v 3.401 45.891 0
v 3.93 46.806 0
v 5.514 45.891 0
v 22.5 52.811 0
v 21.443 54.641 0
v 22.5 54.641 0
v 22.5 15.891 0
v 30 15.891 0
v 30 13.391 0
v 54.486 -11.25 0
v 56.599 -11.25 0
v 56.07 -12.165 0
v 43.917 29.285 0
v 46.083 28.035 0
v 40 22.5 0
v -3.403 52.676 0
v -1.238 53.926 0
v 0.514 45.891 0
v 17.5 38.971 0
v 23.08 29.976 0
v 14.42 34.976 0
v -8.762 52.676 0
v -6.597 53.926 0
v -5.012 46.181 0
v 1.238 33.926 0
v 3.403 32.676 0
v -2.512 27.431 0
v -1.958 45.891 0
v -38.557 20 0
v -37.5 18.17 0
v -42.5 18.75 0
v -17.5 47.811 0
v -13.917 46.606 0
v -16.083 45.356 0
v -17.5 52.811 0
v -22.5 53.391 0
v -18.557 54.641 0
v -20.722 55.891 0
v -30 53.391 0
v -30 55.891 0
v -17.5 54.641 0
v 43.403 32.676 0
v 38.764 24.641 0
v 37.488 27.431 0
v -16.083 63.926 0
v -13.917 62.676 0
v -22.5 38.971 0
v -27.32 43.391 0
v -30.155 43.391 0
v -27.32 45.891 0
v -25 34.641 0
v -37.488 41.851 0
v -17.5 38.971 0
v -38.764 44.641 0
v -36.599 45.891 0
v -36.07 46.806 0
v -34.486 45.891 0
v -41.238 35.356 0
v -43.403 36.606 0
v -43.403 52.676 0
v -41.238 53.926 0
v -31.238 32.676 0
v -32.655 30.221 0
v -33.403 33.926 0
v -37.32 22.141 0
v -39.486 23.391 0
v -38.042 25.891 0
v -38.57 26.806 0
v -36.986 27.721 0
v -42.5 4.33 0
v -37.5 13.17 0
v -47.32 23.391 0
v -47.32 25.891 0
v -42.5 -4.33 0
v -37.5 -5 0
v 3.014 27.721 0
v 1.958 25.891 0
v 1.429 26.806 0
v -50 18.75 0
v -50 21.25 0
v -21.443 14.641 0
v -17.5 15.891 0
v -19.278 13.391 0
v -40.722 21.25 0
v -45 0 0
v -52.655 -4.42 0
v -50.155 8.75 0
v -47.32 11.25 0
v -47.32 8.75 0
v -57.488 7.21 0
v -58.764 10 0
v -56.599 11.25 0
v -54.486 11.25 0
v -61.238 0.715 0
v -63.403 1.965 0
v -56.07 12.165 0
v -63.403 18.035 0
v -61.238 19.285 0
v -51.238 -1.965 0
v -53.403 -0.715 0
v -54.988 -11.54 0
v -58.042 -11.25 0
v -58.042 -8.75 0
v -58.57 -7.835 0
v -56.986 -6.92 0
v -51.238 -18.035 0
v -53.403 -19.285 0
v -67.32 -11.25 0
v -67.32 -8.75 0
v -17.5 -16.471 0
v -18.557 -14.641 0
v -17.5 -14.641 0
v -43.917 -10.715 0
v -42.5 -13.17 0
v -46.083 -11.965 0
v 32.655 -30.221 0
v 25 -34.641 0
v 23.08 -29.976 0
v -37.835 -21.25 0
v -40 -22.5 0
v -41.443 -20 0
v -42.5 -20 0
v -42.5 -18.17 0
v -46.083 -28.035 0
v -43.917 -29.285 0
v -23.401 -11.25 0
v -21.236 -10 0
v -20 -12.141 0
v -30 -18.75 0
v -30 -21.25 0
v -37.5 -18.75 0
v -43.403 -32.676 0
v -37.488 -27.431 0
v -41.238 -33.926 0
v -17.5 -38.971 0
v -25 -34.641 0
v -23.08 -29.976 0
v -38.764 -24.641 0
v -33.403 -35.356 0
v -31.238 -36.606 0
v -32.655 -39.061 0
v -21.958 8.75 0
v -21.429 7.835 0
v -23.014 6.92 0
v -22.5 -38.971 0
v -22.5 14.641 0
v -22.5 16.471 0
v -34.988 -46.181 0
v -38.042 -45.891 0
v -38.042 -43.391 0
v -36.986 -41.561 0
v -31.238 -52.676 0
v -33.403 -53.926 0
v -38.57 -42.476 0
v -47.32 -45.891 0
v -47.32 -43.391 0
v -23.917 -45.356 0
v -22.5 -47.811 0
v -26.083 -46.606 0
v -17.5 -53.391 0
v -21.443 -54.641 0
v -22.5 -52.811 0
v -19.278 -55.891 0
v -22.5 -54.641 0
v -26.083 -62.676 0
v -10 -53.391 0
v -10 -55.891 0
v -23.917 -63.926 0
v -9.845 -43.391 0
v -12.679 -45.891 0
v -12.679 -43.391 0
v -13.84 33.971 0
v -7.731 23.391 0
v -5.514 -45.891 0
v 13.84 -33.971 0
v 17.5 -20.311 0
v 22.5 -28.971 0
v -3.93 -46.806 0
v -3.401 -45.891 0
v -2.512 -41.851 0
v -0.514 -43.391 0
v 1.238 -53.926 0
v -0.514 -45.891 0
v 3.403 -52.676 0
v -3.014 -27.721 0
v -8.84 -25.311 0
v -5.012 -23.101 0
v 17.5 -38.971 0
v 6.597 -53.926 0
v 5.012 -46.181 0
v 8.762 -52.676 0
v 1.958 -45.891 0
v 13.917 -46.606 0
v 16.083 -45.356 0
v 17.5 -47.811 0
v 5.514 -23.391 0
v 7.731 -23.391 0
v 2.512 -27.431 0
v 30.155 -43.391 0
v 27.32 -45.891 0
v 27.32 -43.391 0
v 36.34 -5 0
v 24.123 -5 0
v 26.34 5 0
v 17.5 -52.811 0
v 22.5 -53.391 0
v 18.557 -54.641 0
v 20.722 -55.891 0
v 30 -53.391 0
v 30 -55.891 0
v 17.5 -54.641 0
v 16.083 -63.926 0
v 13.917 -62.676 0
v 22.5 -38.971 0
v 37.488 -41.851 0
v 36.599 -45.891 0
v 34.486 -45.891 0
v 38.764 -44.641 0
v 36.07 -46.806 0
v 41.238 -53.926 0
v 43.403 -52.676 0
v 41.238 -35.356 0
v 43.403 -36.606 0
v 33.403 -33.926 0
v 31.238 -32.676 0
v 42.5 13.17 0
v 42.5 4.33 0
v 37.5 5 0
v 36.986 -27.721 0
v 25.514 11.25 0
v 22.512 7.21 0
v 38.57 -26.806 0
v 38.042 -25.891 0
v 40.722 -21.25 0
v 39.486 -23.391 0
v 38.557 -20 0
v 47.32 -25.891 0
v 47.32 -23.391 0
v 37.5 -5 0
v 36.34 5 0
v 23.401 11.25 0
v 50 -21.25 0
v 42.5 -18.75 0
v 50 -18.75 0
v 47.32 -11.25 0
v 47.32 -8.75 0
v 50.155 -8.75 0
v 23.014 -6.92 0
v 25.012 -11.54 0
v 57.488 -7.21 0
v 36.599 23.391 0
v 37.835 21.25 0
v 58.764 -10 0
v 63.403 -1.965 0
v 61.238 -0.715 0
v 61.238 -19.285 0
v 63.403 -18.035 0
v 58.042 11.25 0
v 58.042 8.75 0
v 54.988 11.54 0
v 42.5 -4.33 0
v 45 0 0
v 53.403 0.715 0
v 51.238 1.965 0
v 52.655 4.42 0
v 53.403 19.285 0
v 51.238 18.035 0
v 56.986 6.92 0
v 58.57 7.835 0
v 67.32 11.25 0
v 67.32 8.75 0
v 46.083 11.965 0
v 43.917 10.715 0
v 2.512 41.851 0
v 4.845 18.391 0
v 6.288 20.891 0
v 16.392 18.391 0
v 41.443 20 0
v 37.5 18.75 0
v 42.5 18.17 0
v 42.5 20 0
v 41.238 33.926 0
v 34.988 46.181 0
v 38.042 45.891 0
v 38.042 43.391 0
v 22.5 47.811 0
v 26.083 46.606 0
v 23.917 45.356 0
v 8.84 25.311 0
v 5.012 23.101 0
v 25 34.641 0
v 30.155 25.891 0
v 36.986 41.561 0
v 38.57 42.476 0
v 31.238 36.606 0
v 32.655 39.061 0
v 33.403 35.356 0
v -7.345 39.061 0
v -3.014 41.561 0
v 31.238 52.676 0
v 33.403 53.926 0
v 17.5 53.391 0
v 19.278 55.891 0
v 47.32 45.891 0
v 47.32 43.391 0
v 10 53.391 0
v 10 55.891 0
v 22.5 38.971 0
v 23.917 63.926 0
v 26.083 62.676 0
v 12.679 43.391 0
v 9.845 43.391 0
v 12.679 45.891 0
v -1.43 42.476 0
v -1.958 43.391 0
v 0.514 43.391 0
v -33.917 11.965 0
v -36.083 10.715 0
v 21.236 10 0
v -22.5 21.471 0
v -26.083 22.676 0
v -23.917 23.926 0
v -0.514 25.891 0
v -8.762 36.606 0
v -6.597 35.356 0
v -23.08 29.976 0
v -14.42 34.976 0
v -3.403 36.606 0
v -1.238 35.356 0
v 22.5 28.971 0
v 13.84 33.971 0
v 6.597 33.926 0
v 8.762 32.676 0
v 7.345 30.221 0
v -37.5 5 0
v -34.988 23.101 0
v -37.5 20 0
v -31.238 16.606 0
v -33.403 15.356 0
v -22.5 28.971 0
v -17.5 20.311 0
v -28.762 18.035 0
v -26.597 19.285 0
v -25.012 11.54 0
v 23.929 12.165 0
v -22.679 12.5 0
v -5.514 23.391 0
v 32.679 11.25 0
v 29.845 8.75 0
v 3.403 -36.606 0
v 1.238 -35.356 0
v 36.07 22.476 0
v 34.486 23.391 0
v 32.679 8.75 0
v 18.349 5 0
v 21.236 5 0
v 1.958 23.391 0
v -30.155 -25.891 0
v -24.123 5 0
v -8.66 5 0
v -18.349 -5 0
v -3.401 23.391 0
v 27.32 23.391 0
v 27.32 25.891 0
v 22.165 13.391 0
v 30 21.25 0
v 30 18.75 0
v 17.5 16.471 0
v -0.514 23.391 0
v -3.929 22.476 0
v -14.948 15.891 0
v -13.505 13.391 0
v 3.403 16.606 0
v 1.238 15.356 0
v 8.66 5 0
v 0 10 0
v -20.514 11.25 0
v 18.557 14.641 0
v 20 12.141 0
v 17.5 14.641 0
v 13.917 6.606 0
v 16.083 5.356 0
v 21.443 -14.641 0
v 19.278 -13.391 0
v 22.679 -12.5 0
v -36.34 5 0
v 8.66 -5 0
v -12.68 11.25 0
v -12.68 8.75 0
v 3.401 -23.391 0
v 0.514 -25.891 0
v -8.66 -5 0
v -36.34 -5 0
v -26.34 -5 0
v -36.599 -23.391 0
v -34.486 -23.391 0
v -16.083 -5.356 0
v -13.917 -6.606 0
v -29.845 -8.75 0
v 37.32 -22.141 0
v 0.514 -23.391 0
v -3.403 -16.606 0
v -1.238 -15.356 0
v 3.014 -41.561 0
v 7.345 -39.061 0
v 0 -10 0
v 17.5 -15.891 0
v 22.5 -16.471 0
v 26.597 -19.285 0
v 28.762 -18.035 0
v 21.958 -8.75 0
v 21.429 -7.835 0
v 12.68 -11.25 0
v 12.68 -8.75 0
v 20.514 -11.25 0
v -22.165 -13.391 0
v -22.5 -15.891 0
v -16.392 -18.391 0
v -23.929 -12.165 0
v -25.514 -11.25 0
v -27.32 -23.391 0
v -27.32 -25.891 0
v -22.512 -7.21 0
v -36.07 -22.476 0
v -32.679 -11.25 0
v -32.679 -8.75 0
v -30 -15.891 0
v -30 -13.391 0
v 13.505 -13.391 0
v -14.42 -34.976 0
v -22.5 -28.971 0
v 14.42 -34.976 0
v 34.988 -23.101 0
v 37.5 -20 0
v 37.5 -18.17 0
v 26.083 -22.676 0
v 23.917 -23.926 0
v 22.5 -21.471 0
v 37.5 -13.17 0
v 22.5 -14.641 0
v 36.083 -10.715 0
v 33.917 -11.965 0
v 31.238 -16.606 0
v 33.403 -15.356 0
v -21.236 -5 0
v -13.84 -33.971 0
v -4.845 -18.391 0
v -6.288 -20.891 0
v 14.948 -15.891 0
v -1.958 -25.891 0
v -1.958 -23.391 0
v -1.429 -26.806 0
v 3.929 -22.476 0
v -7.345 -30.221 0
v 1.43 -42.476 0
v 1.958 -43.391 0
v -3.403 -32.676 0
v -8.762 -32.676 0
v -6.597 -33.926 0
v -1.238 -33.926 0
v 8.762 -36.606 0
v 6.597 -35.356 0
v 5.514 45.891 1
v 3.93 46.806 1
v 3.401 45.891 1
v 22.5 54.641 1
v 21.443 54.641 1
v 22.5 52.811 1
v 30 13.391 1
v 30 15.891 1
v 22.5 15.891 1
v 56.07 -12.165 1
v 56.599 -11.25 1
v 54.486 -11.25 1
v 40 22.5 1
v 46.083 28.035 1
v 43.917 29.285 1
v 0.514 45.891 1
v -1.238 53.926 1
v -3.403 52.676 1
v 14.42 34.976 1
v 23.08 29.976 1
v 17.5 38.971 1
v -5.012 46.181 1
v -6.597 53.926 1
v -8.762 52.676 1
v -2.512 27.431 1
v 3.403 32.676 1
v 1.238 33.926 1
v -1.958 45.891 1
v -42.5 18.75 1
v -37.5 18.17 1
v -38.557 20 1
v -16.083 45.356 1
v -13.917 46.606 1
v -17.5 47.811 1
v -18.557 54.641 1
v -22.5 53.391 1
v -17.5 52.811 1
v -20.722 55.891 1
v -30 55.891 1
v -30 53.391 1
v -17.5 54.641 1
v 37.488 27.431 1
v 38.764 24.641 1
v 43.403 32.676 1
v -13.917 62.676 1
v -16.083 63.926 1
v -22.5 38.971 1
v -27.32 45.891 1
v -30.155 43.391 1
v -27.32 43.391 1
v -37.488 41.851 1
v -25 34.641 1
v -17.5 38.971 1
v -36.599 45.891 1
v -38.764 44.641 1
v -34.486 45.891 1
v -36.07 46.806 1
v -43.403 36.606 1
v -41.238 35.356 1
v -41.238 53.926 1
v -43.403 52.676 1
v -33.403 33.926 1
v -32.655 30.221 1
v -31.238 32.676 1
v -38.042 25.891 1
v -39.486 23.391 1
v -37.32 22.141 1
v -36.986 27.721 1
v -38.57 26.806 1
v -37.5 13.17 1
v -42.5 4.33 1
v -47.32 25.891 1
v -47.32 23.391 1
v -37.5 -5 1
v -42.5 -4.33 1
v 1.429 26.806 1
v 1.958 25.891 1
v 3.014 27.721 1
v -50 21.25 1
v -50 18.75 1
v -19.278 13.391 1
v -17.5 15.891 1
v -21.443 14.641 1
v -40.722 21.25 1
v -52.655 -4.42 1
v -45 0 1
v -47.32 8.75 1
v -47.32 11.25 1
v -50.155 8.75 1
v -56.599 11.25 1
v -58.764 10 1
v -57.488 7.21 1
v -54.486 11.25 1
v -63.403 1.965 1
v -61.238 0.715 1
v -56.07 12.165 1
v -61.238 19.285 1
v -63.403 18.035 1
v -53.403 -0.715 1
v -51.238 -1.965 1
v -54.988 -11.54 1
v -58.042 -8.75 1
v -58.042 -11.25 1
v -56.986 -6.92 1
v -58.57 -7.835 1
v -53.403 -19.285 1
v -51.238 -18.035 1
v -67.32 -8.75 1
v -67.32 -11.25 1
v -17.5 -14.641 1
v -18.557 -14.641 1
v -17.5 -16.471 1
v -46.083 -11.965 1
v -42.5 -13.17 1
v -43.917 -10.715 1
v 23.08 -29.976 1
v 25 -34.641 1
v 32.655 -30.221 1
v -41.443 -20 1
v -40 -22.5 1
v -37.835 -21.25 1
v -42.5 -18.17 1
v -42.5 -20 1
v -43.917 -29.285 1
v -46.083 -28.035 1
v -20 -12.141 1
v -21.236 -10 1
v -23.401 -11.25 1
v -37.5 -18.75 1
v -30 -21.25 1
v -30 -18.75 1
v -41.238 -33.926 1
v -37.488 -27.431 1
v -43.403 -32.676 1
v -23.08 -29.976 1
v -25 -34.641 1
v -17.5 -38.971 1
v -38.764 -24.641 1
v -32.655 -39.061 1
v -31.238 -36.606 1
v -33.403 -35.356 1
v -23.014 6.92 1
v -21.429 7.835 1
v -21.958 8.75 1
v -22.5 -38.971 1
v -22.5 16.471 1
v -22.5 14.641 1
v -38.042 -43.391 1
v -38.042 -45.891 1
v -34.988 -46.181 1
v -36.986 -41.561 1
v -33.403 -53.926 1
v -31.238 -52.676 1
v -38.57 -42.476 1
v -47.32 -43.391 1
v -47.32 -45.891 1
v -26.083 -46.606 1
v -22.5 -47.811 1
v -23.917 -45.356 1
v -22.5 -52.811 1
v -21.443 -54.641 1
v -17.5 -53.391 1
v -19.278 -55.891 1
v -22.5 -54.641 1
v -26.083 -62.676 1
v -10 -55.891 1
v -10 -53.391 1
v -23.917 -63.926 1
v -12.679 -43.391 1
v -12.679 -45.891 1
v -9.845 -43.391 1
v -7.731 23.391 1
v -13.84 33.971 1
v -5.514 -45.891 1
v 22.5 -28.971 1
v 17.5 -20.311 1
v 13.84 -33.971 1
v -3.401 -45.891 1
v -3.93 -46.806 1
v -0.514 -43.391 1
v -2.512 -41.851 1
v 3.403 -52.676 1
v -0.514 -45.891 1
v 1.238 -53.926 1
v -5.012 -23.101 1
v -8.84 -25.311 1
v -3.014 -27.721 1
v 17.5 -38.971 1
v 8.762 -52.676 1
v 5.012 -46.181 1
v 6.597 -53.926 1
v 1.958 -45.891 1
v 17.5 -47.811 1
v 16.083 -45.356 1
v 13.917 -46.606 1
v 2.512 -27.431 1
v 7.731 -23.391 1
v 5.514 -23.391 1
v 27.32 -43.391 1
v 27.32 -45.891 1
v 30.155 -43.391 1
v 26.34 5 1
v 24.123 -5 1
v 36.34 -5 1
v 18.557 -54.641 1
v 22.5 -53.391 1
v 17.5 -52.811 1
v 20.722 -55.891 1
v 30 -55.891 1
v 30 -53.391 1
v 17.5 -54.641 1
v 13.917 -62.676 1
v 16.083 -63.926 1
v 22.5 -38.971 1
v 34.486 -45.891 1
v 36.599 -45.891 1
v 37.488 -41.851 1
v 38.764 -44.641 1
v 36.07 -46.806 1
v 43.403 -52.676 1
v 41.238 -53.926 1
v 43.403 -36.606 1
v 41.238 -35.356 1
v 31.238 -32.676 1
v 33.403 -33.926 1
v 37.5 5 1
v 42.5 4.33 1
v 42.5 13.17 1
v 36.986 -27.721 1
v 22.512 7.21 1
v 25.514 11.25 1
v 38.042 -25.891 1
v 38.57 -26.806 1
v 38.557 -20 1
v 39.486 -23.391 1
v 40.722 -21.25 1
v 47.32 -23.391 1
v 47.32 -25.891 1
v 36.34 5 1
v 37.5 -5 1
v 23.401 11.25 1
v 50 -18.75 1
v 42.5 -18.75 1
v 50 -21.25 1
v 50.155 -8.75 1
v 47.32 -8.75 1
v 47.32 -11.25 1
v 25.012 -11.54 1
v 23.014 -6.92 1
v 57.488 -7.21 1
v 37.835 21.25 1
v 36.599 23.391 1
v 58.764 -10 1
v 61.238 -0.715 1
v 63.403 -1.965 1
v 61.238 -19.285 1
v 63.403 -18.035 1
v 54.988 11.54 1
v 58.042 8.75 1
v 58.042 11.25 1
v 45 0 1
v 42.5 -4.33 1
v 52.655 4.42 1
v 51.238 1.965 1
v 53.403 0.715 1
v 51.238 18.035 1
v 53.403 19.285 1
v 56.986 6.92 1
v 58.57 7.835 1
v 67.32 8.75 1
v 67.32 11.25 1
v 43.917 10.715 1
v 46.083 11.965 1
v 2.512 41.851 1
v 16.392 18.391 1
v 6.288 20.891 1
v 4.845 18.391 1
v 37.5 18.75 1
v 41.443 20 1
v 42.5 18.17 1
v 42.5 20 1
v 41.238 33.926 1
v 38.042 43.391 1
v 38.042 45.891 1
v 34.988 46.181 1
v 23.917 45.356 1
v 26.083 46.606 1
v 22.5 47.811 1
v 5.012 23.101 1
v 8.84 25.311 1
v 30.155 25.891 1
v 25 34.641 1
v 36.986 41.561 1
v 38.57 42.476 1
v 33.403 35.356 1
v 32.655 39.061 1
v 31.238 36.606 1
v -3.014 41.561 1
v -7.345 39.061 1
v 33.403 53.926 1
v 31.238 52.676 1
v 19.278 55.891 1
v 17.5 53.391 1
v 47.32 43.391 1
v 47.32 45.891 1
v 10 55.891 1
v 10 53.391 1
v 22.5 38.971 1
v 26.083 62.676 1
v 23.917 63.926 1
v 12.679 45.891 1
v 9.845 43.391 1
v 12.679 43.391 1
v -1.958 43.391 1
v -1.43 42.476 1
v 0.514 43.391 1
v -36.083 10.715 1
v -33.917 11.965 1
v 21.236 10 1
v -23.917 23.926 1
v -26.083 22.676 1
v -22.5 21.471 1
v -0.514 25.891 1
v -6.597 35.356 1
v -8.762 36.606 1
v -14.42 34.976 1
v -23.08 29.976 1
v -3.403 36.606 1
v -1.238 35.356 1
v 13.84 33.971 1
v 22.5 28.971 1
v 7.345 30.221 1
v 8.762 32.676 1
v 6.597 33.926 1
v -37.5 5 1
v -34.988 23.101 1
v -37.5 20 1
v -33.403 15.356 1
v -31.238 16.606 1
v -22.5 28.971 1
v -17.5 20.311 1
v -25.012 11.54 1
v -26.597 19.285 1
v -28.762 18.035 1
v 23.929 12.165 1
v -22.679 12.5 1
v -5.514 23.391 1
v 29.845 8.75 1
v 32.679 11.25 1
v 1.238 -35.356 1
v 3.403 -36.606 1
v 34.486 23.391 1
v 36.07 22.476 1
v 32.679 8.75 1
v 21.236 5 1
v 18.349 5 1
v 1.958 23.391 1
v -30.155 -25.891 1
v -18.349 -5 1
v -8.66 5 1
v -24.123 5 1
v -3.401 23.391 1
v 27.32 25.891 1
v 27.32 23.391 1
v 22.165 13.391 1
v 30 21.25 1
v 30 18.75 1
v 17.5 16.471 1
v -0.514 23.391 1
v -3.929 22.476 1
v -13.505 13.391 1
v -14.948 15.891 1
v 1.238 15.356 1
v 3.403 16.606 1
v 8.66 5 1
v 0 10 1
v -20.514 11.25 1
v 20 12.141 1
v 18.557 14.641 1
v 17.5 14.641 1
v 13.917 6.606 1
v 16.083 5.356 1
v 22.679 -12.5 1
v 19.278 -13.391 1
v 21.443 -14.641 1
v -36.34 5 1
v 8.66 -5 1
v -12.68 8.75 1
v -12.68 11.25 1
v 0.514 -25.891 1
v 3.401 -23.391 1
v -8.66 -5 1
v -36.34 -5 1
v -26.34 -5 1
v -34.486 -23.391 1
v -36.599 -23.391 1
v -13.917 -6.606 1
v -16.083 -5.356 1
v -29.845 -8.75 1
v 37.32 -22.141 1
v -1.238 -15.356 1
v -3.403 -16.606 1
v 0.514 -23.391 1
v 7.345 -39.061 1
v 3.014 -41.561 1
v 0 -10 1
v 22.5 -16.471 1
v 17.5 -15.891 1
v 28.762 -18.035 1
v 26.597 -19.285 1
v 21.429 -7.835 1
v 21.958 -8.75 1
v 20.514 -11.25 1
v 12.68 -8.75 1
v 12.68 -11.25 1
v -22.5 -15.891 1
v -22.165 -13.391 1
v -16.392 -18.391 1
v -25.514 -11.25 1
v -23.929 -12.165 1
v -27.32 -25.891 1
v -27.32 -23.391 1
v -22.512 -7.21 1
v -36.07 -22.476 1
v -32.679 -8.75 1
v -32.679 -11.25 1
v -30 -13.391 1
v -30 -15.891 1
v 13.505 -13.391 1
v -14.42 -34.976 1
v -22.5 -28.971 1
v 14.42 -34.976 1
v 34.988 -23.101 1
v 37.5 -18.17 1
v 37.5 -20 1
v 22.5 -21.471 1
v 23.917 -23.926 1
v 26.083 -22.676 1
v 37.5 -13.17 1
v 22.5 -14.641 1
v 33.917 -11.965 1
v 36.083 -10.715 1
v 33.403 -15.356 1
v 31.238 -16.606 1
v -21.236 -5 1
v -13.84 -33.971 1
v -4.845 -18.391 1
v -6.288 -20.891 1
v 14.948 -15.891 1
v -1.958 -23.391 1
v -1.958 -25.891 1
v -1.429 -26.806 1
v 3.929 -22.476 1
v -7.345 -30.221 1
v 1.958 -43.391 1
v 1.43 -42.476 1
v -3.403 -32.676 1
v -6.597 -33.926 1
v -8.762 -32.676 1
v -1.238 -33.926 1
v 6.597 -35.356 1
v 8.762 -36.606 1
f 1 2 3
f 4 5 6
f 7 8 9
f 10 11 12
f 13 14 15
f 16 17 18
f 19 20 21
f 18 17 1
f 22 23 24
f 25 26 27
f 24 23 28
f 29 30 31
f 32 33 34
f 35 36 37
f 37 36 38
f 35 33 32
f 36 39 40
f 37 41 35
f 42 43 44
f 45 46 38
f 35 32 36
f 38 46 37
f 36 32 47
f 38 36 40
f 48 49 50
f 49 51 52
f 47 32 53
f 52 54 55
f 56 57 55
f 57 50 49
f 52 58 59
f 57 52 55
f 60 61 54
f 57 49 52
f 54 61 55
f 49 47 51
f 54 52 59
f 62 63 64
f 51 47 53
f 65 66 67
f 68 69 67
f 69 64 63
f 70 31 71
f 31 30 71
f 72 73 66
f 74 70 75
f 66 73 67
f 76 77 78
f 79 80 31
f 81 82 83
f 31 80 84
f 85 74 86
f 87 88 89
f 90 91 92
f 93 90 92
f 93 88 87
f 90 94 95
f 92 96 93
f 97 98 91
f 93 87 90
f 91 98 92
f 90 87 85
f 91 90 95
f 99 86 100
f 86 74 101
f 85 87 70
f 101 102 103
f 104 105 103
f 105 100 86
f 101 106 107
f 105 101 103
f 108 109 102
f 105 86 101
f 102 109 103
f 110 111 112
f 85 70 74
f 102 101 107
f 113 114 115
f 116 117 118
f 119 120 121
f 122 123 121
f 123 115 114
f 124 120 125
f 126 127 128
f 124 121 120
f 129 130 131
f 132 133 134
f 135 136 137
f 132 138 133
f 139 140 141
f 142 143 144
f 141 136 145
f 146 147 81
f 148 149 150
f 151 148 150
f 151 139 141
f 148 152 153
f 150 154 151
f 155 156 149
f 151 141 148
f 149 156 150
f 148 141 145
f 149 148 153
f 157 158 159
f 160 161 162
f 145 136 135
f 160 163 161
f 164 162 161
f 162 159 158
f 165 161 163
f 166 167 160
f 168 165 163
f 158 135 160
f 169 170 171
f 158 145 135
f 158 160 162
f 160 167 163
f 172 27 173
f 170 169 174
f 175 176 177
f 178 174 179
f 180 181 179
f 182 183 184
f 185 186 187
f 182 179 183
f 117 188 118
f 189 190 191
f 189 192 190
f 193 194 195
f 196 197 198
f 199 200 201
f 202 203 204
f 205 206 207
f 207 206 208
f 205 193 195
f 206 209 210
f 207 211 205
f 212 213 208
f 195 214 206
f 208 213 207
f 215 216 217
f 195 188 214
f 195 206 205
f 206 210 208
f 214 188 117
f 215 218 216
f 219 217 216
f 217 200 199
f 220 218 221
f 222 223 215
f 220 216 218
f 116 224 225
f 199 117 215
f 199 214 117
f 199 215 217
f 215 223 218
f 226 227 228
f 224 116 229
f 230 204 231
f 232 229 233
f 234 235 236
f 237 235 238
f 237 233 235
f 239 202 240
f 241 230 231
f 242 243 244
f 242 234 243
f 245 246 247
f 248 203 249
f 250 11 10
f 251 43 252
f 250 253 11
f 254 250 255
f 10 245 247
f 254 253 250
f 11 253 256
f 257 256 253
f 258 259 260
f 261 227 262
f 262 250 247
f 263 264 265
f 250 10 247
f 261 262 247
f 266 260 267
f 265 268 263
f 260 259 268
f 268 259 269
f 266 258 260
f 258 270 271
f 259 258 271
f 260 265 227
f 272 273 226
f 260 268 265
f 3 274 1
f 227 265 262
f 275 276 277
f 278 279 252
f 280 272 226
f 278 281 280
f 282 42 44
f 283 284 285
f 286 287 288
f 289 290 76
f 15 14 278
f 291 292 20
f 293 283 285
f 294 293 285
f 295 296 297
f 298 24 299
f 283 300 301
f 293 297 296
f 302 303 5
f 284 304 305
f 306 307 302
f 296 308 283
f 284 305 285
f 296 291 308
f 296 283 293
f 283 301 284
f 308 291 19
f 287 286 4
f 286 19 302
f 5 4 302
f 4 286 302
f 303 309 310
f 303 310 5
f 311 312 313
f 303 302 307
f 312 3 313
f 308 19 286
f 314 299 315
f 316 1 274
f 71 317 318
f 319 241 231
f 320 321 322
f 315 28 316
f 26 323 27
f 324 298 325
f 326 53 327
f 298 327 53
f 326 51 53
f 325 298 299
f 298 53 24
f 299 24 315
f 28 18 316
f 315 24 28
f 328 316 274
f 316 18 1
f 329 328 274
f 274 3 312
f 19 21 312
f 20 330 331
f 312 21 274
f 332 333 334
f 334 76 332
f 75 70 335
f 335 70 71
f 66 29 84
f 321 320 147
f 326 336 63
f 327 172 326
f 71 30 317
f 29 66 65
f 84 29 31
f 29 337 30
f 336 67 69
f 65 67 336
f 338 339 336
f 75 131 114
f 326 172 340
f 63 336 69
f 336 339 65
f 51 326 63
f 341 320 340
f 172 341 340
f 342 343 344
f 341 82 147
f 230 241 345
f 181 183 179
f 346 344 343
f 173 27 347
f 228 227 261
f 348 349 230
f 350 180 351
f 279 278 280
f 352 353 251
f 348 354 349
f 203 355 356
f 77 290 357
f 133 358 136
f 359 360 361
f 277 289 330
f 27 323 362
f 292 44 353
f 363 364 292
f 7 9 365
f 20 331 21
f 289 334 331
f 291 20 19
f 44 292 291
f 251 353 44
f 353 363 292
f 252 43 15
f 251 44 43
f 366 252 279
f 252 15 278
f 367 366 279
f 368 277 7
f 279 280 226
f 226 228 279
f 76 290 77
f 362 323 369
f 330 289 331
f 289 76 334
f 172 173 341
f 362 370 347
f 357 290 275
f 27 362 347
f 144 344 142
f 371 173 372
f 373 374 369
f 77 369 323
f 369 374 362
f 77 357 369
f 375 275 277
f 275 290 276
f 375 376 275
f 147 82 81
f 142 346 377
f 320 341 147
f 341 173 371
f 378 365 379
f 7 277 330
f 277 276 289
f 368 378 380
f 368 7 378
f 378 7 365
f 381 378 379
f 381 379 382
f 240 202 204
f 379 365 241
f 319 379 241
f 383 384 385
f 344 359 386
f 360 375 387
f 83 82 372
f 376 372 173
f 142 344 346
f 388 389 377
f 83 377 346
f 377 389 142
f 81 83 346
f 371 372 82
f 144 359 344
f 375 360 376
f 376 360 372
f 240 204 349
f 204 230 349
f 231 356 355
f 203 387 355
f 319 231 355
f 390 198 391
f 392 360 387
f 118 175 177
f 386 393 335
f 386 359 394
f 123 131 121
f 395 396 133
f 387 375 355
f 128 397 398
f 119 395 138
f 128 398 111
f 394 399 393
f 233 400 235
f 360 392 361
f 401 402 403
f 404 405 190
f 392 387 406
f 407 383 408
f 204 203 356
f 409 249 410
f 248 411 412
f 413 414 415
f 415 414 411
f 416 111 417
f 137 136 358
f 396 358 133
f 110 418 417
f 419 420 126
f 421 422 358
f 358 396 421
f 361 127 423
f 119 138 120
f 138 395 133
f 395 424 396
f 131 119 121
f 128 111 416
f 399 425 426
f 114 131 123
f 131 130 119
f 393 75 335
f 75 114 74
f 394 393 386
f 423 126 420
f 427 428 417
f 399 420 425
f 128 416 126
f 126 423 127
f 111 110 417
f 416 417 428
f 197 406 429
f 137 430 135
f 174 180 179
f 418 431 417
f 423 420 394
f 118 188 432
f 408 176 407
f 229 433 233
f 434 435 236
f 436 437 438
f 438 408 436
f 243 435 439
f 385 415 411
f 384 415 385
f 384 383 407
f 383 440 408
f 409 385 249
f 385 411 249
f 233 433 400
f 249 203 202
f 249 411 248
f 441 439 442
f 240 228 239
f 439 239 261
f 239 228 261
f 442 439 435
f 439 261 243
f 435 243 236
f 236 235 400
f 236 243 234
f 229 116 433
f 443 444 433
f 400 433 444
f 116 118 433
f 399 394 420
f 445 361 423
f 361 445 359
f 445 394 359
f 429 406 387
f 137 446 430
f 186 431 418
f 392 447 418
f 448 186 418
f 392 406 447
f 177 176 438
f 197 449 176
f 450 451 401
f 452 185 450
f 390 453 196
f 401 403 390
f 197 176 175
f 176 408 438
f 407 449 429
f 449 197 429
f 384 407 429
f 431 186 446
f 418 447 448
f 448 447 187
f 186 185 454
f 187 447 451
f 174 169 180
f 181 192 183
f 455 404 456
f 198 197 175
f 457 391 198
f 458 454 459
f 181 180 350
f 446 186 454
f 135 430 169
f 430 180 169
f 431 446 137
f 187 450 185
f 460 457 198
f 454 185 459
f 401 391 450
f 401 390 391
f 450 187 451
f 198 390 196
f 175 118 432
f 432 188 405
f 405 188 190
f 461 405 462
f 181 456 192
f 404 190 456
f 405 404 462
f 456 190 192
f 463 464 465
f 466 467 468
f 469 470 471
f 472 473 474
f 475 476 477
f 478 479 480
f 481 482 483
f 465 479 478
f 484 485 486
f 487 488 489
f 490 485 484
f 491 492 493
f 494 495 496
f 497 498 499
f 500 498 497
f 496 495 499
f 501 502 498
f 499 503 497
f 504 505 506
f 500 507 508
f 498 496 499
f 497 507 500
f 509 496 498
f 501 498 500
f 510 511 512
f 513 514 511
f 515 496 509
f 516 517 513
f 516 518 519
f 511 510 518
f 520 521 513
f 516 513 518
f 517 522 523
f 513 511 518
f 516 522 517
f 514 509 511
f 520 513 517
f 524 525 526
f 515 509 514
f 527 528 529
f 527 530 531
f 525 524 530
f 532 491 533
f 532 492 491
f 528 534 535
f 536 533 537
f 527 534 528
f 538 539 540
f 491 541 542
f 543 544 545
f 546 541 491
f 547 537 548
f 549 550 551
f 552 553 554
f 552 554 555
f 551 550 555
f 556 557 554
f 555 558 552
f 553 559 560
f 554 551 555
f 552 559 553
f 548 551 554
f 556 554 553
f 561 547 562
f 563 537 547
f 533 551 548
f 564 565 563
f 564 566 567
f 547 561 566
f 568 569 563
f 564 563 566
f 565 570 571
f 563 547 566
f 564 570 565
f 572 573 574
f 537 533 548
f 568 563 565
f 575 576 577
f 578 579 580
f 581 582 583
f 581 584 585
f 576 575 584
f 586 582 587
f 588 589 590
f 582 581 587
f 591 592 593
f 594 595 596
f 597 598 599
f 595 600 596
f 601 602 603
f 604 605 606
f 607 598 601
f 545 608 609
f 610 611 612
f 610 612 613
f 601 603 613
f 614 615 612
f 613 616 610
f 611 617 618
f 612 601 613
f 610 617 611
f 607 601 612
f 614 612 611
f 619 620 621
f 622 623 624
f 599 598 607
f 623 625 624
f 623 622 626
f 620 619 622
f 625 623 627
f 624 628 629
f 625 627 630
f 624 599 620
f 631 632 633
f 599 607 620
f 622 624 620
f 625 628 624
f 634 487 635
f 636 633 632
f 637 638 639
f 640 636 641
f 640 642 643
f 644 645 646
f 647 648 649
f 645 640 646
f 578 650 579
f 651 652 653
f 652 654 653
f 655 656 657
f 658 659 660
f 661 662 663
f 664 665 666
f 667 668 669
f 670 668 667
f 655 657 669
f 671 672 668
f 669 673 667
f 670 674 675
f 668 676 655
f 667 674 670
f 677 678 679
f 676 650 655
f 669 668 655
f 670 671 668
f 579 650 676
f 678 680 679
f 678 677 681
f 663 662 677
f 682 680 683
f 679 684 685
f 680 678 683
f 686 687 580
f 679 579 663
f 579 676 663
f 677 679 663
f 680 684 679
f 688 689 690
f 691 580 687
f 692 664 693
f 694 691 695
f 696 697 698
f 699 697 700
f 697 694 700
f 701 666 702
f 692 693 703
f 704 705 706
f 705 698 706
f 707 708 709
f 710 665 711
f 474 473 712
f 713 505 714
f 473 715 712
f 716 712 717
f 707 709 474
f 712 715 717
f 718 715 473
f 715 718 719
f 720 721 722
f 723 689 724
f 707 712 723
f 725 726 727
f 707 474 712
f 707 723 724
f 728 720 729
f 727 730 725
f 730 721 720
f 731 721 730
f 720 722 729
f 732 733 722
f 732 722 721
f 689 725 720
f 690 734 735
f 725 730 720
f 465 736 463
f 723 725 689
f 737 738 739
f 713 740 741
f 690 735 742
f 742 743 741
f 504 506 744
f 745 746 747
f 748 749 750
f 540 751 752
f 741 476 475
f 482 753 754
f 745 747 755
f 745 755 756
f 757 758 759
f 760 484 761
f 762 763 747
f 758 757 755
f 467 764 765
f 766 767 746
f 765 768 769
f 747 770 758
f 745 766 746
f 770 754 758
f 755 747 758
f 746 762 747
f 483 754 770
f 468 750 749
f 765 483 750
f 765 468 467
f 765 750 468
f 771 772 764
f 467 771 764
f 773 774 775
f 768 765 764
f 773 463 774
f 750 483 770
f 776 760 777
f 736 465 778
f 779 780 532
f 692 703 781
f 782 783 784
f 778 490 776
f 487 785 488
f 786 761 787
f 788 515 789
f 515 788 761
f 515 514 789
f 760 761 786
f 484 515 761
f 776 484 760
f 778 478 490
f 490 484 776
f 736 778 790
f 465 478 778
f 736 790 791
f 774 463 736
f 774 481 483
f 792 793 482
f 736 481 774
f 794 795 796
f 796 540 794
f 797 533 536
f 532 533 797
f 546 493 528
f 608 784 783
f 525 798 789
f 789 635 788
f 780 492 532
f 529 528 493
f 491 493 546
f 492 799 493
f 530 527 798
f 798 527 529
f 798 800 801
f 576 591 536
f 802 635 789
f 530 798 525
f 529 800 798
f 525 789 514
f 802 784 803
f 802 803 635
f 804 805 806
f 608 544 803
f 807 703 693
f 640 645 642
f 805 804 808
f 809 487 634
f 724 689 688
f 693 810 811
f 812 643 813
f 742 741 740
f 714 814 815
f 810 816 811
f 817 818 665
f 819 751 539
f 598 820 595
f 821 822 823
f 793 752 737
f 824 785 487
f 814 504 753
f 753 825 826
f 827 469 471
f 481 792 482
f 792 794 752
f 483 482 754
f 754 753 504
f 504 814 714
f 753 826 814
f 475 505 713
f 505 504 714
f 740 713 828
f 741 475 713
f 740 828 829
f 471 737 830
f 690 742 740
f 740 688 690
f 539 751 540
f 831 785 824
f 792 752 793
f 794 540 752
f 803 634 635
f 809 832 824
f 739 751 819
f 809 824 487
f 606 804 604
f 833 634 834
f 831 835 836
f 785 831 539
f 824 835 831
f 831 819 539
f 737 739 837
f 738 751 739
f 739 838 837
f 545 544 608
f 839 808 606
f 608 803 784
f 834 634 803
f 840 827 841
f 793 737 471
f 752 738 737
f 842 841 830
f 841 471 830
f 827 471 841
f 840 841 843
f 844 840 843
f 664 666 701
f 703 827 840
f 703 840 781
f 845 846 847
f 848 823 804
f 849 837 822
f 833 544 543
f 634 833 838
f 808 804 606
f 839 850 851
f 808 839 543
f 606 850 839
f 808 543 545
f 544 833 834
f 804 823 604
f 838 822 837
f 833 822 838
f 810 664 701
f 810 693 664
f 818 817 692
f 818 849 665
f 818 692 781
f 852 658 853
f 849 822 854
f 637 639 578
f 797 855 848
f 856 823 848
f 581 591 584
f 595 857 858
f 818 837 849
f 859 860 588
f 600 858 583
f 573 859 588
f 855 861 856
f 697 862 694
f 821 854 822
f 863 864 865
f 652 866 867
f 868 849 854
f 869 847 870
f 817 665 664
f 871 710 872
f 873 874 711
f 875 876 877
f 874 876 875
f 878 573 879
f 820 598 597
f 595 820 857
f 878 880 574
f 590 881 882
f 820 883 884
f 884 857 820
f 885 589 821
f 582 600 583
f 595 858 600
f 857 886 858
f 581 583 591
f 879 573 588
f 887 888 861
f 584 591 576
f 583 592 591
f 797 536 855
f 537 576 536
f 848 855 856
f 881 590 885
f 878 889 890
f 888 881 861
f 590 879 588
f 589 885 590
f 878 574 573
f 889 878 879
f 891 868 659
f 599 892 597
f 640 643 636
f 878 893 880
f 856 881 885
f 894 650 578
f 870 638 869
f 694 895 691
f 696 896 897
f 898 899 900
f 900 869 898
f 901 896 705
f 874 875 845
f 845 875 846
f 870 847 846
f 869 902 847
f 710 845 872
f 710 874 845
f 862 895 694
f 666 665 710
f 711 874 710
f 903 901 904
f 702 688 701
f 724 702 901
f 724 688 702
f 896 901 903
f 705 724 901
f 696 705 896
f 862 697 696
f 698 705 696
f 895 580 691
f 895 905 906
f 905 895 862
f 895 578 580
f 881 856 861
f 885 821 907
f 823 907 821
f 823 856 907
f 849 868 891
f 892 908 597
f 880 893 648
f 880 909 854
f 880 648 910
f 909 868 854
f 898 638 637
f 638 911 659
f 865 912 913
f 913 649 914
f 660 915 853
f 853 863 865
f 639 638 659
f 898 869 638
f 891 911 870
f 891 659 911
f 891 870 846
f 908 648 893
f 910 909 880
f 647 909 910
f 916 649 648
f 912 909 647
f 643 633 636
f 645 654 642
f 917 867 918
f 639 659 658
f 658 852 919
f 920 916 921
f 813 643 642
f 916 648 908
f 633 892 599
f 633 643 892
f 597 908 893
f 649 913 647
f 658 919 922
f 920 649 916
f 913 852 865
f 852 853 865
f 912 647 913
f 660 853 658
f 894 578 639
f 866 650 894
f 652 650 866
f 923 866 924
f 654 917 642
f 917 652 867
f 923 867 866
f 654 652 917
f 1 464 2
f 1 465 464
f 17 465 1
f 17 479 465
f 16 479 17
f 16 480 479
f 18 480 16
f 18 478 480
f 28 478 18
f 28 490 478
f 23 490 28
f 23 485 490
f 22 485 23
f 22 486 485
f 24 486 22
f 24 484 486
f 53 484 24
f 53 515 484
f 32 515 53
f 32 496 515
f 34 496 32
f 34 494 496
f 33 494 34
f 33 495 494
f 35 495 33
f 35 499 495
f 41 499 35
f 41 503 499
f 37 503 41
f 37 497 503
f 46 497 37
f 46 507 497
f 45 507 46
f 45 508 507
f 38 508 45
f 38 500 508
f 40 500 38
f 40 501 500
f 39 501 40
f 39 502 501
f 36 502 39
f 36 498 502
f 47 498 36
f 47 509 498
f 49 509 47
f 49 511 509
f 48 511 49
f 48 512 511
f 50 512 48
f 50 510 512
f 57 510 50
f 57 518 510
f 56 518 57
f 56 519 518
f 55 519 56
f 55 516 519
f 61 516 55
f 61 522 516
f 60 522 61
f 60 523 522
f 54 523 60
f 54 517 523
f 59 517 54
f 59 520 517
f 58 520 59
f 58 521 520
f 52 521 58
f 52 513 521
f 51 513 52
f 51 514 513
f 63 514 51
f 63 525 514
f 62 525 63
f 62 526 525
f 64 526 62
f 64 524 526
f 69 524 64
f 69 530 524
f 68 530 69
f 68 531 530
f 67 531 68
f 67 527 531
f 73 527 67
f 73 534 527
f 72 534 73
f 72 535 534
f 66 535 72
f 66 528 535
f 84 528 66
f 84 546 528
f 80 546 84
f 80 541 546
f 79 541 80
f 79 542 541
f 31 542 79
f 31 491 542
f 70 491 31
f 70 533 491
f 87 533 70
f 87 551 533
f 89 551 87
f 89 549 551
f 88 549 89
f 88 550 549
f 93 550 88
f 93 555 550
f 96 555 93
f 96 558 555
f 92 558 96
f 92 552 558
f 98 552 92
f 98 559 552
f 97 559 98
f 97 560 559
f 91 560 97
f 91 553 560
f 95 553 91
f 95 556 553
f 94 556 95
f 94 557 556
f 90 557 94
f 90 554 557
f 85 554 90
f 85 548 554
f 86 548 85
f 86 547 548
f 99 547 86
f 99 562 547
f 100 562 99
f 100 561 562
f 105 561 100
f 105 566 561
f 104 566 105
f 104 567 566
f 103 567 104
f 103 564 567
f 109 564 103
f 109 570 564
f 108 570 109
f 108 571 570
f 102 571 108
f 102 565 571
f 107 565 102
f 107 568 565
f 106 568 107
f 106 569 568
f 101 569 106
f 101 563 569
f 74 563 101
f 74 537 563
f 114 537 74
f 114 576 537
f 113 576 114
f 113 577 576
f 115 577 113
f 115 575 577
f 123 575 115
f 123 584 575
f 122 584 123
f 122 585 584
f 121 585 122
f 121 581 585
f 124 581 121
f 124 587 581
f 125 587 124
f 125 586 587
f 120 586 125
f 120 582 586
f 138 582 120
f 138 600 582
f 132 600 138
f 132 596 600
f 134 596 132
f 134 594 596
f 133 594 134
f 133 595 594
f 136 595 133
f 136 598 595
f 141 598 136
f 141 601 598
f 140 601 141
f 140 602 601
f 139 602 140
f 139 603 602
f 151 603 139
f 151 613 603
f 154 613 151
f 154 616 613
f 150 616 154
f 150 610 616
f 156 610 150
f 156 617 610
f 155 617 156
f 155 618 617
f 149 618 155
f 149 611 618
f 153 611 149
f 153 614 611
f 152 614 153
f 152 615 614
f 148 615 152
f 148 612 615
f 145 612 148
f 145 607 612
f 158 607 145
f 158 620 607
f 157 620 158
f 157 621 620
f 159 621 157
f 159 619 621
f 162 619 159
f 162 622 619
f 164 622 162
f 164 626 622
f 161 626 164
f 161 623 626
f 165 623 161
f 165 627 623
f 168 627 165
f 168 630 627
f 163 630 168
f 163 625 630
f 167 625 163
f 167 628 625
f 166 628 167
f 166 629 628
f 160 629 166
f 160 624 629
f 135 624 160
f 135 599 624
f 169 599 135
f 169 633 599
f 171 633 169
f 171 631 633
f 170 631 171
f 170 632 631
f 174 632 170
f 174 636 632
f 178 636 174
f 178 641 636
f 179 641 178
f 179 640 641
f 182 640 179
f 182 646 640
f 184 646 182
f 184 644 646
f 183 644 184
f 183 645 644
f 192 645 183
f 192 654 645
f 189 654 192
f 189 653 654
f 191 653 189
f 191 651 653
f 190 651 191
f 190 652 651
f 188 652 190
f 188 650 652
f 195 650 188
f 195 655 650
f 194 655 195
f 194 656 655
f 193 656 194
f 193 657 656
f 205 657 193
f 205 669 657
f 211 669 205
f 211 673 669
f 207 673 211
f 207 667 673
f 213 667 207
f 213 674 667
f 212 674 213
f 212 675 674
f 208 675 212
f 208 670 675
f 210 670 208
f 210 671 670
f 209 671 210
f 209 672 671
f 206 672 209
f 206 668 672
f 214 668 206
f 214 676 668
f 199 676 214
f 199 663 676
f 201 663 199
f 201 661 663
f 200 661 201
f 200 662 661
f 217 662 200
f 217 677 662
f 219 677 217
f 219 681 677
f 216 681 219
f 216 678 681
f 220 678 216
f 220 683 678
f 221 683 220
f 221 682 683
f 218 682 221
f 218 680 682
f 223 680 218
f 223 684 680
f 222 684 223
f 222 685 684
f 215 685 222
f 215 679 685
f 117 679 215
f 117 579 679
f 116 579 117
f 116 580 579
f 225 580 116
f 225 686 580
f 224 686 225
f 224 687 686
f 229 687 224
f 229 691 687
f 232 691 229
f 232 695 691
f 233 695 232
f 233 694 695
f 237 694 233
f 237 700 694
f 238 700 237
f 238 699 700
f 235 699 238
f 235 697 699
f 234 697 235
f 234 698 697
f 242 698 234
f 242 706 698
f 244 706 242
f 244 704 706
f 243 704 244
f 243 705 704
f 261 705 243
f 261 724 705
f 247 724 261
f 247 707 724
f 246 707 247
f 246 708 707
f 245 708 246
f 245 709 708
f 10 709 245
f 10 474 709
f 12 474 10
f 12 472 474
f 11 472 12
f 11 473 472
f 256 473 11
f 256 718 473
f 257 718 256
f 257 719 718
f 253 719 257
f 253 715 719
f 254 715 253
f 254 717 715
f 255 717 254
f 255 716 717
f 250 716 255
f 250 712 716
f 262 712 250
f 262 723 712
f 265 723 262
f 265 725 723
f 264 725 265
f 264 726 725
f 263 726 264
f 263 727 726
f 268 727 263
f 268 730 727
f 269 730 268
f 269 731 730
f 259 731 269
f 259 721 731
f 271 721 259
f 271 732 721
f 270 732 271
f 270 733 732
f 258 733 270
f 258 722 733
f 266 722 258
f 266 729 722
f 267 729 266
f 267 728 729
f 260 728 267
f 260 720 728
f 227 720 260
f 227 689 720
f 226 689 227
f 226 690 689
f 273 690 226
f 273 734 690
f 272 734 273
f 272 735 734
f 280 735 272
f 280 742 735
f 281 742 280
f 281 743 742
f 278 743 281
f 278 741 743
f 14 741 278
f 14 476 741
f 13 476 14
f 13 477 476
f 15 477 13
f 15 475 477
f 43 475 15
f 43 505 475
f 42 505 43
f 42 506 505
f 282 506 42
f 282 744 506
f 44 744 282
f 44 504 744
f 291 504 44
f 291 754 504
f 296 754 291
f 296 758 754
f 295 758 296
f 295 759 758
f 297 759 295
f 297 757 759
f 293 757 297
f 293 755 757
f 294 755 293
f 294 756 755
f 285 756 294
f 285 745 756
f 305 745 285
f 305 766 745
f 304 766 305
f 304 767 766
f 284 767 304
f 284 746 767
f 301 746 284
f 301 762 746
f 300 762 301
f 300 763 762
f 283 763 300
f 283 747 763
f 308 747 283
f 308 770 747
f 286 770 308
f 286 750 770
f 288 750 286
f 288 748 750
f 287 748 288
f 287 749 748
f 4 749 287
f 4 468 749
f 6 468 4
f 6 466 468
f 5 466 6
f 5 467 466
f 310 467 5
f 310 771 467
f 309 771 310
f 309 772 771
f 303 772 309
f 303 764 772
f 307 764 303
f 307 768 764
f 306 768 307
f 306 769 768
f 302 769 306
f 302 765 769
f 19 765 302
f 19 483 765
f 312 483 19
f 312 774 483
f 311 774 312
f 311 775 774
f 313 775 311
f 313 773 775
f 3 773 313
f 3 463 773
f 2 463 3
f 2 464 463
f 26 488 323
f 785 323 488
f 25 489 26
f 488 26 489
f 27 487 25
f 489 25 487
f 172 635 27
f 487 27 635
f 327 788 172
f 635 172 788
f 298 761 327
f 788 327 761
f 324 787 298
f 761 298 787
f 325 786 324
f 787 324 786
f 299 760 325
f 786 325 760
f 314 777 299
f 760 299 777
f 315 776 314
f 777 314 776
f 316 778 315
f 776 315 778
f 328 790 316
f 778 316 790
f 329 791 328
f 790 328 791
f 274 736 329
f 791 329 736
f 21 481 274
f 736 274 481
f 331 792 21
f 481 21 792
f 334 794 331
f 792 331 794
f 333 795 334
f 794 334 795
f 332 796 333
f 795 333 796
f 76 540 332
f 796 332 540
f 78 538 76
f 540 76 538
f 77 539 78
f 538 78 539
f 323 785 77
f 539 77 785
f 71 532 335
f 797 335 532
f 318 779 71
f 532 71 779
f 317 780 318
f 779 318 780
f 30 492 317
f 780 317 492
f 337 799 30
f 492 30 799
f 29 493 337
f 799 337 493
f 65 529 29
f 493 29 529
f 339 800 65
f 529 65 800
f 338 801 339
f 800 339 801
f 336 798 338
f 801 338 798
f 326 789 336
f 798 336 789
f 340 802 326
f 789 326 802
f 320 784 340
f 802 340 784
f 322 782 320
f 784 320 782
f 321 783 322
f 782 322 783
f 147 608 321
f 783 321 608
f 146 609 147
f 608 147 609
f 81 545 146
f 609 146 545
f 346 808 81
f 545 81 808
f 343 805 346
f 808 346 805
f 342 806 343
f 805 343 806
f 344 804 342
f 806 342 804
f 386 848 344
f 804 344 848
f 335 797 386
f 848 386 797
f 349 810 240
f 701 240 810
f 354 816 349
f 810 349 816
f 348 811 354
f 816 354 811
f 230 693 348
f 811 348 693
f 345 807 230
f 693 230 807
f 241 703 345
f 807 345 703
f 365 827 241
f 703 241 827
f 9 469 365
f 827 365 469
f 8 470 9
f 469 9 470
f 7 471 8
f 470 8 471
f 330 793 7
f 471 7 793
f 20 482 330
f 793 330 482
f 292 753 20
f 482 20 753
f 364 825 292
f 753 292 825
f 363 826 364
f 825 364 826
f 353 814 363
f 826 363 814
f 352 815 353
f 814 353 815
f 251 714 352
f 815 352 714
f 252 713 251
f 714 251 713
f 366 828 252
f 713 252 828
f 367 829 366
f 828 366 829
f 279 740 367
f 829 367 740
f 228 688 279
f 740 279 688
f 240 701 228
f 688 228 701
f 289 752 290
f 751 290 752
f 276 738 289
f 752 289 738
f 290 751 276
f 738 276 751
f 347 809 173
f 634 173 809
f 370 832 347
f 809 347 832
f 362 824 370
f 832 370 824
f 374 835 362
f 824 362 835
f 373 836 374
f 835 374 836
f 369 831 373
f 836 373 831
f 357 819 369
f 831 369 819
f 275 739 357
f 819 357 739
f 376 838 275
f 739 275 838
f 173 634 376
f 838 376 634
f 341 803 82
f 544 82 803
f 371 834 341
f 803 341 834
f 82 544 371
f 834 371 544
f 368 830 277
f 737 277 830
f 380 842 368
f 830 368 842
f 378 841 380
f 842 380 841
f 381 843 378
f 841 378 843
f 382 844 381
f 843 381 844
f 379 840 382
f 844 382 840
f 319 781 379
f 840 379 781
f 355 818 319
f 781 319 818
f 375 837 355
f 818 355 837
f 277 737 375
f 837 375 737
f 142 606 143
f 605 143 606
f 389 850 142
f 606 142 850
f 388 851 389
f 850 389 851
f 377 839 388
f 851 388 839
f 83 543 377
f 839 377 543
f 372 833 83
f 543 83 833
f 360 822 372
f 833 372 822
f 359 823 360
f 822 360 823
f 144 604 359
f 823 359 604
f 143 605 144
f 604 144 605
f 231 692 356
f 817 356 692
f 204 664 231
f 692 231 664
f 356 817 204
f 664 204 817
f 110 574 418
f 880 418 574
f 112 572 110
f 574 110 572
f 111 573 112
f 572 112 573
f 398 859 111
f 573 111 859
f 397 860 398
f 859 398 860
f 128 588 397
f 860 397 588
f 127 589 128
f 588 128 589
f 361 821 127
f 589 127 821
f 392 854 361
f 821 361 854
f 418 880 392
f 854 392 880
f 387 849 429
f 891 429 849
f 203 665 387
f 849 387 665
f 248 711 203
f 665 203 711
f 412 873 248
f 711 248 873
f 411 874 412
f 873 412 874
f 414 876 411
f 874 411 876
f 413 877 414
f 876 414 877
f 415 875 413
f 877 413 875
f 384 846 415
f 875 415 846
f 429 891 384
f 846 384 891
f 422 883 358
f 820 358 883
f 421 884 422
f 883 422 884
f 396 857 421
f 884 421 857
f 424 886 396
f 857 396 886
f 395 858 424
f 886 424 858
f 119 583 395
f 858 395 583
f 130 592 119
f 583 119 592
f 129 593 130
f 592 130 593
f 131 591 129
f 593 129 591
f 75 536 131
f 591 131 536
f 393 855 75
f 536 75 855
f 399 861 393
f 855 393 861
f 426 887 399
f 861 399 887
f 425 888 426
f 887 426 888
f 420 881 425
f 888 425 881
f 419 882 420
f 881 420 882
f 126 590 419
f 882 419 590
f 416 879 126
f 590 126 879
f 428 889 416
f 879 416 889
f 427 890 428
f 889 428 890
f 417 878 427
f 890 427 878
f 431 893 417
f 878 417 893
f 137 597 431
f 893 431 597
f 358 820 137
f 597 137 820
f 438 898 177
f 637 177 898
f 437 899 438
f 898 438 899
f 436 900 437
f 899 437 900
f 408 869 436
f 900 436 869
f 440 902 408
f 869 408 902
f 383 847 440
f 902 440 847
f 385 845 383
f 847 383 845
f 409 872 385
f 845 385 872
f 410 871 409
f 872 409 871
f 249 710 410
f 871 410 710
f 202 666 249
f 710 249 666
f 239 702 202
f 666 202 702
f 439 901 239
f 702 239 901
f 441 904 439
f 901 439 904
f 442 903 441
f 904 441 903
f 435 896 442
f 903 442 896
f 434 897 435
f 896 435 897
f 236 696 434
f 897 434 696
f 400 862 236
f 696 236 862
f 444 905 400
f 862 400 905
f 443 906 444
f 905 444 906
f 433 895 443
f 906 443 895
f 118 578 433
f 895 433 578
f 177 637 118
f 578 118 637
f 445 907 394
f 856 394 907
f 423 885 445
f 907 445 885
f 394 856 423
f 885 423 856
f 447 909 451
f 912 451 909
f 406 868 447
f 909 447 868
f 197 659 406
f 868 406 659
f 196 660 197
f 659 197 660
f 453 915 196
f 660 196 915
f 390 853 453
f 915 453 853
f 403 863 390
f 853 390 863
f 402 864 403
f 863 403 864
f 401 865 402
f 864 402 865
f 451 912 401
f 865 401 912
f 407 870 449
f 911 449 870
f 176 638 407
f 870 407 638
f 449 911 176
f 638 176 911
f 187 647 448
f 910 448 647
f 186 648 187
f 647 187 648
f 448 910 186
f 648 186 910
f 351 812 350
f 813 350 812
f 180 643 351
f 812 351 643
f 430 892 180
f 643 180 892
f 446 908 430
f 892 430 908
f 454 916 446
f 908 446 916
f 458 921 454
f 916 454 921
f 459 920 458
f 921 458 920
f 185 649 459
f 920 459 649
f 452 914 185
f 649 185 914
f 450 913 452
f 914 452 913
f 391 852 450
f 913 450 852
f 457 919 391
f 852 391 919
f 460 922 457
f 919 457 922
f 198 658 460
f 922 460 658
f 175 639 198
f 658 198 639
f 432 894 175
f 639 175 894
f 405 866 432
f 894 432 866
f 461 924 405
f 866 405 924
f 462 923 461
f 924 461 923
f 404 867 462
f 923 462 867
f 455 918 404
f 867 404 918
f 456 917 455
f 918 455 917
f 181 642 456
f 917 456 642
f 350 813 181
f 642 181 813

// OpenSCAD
// limits detail for printing
minLineW = 10; // [5:20]
// how much to scale on each iteration
scaleIter = 0.5; // [0.3:0.005:0.6]
// how many degrees to twist each iteration
twistIter = 30;  // [0:60] 
// when to run 3 rots instead of 6. Contains flags
skipPattern = 3; // [0:8]
lineThickness = 10; // [5:1:15]

color("#fff") linear_extrude(1) snowflake();

module snowflake(i=0, scaleTally=1) {
    w = 40;
    h = lineThickness;
    sym = bit(skipPattern,i) ? 6 : 3;
    
    for (j=[0:sym-1]) rz(j*360/sym) {
        translate([0,-h/2]) square([w,h]);
        if (i<4 && w*scaleTally > minLineW)
            translate([w,0])
            scale(scaleIter) // ← Param
            mirror([1,0])
            rz(twistIter)    // ← Param
            snowflake(i+1, scaleTally * scaleIter);
    }
}

module rz(z) { rotate([0,0,z]) children(); }

// No bitwise ops so we use FP math
// non math / CS nerds turn away here ¡¿¡¿
// floor( x / 2^n ) is the same as ( x >> n )
// therefore extract bit is:
// x >> n - (x >> (n+1)) << 1
// example
// x = 01100110
// n = 5
// ...substitute and solve
// 01100110 >> 5 - (01100110 >> 6) << 1
//    ↓ Cut 5          ↓ Cut 6
// 11 »00110     - ( 1 »100110 ) << 1
// 11 - 1 << 1
// 11 - 10
// 1
function bit (x,n) =
    1 ==
    (floor(x / 2^n) - 2*floor(x / 2^(n+1)));
